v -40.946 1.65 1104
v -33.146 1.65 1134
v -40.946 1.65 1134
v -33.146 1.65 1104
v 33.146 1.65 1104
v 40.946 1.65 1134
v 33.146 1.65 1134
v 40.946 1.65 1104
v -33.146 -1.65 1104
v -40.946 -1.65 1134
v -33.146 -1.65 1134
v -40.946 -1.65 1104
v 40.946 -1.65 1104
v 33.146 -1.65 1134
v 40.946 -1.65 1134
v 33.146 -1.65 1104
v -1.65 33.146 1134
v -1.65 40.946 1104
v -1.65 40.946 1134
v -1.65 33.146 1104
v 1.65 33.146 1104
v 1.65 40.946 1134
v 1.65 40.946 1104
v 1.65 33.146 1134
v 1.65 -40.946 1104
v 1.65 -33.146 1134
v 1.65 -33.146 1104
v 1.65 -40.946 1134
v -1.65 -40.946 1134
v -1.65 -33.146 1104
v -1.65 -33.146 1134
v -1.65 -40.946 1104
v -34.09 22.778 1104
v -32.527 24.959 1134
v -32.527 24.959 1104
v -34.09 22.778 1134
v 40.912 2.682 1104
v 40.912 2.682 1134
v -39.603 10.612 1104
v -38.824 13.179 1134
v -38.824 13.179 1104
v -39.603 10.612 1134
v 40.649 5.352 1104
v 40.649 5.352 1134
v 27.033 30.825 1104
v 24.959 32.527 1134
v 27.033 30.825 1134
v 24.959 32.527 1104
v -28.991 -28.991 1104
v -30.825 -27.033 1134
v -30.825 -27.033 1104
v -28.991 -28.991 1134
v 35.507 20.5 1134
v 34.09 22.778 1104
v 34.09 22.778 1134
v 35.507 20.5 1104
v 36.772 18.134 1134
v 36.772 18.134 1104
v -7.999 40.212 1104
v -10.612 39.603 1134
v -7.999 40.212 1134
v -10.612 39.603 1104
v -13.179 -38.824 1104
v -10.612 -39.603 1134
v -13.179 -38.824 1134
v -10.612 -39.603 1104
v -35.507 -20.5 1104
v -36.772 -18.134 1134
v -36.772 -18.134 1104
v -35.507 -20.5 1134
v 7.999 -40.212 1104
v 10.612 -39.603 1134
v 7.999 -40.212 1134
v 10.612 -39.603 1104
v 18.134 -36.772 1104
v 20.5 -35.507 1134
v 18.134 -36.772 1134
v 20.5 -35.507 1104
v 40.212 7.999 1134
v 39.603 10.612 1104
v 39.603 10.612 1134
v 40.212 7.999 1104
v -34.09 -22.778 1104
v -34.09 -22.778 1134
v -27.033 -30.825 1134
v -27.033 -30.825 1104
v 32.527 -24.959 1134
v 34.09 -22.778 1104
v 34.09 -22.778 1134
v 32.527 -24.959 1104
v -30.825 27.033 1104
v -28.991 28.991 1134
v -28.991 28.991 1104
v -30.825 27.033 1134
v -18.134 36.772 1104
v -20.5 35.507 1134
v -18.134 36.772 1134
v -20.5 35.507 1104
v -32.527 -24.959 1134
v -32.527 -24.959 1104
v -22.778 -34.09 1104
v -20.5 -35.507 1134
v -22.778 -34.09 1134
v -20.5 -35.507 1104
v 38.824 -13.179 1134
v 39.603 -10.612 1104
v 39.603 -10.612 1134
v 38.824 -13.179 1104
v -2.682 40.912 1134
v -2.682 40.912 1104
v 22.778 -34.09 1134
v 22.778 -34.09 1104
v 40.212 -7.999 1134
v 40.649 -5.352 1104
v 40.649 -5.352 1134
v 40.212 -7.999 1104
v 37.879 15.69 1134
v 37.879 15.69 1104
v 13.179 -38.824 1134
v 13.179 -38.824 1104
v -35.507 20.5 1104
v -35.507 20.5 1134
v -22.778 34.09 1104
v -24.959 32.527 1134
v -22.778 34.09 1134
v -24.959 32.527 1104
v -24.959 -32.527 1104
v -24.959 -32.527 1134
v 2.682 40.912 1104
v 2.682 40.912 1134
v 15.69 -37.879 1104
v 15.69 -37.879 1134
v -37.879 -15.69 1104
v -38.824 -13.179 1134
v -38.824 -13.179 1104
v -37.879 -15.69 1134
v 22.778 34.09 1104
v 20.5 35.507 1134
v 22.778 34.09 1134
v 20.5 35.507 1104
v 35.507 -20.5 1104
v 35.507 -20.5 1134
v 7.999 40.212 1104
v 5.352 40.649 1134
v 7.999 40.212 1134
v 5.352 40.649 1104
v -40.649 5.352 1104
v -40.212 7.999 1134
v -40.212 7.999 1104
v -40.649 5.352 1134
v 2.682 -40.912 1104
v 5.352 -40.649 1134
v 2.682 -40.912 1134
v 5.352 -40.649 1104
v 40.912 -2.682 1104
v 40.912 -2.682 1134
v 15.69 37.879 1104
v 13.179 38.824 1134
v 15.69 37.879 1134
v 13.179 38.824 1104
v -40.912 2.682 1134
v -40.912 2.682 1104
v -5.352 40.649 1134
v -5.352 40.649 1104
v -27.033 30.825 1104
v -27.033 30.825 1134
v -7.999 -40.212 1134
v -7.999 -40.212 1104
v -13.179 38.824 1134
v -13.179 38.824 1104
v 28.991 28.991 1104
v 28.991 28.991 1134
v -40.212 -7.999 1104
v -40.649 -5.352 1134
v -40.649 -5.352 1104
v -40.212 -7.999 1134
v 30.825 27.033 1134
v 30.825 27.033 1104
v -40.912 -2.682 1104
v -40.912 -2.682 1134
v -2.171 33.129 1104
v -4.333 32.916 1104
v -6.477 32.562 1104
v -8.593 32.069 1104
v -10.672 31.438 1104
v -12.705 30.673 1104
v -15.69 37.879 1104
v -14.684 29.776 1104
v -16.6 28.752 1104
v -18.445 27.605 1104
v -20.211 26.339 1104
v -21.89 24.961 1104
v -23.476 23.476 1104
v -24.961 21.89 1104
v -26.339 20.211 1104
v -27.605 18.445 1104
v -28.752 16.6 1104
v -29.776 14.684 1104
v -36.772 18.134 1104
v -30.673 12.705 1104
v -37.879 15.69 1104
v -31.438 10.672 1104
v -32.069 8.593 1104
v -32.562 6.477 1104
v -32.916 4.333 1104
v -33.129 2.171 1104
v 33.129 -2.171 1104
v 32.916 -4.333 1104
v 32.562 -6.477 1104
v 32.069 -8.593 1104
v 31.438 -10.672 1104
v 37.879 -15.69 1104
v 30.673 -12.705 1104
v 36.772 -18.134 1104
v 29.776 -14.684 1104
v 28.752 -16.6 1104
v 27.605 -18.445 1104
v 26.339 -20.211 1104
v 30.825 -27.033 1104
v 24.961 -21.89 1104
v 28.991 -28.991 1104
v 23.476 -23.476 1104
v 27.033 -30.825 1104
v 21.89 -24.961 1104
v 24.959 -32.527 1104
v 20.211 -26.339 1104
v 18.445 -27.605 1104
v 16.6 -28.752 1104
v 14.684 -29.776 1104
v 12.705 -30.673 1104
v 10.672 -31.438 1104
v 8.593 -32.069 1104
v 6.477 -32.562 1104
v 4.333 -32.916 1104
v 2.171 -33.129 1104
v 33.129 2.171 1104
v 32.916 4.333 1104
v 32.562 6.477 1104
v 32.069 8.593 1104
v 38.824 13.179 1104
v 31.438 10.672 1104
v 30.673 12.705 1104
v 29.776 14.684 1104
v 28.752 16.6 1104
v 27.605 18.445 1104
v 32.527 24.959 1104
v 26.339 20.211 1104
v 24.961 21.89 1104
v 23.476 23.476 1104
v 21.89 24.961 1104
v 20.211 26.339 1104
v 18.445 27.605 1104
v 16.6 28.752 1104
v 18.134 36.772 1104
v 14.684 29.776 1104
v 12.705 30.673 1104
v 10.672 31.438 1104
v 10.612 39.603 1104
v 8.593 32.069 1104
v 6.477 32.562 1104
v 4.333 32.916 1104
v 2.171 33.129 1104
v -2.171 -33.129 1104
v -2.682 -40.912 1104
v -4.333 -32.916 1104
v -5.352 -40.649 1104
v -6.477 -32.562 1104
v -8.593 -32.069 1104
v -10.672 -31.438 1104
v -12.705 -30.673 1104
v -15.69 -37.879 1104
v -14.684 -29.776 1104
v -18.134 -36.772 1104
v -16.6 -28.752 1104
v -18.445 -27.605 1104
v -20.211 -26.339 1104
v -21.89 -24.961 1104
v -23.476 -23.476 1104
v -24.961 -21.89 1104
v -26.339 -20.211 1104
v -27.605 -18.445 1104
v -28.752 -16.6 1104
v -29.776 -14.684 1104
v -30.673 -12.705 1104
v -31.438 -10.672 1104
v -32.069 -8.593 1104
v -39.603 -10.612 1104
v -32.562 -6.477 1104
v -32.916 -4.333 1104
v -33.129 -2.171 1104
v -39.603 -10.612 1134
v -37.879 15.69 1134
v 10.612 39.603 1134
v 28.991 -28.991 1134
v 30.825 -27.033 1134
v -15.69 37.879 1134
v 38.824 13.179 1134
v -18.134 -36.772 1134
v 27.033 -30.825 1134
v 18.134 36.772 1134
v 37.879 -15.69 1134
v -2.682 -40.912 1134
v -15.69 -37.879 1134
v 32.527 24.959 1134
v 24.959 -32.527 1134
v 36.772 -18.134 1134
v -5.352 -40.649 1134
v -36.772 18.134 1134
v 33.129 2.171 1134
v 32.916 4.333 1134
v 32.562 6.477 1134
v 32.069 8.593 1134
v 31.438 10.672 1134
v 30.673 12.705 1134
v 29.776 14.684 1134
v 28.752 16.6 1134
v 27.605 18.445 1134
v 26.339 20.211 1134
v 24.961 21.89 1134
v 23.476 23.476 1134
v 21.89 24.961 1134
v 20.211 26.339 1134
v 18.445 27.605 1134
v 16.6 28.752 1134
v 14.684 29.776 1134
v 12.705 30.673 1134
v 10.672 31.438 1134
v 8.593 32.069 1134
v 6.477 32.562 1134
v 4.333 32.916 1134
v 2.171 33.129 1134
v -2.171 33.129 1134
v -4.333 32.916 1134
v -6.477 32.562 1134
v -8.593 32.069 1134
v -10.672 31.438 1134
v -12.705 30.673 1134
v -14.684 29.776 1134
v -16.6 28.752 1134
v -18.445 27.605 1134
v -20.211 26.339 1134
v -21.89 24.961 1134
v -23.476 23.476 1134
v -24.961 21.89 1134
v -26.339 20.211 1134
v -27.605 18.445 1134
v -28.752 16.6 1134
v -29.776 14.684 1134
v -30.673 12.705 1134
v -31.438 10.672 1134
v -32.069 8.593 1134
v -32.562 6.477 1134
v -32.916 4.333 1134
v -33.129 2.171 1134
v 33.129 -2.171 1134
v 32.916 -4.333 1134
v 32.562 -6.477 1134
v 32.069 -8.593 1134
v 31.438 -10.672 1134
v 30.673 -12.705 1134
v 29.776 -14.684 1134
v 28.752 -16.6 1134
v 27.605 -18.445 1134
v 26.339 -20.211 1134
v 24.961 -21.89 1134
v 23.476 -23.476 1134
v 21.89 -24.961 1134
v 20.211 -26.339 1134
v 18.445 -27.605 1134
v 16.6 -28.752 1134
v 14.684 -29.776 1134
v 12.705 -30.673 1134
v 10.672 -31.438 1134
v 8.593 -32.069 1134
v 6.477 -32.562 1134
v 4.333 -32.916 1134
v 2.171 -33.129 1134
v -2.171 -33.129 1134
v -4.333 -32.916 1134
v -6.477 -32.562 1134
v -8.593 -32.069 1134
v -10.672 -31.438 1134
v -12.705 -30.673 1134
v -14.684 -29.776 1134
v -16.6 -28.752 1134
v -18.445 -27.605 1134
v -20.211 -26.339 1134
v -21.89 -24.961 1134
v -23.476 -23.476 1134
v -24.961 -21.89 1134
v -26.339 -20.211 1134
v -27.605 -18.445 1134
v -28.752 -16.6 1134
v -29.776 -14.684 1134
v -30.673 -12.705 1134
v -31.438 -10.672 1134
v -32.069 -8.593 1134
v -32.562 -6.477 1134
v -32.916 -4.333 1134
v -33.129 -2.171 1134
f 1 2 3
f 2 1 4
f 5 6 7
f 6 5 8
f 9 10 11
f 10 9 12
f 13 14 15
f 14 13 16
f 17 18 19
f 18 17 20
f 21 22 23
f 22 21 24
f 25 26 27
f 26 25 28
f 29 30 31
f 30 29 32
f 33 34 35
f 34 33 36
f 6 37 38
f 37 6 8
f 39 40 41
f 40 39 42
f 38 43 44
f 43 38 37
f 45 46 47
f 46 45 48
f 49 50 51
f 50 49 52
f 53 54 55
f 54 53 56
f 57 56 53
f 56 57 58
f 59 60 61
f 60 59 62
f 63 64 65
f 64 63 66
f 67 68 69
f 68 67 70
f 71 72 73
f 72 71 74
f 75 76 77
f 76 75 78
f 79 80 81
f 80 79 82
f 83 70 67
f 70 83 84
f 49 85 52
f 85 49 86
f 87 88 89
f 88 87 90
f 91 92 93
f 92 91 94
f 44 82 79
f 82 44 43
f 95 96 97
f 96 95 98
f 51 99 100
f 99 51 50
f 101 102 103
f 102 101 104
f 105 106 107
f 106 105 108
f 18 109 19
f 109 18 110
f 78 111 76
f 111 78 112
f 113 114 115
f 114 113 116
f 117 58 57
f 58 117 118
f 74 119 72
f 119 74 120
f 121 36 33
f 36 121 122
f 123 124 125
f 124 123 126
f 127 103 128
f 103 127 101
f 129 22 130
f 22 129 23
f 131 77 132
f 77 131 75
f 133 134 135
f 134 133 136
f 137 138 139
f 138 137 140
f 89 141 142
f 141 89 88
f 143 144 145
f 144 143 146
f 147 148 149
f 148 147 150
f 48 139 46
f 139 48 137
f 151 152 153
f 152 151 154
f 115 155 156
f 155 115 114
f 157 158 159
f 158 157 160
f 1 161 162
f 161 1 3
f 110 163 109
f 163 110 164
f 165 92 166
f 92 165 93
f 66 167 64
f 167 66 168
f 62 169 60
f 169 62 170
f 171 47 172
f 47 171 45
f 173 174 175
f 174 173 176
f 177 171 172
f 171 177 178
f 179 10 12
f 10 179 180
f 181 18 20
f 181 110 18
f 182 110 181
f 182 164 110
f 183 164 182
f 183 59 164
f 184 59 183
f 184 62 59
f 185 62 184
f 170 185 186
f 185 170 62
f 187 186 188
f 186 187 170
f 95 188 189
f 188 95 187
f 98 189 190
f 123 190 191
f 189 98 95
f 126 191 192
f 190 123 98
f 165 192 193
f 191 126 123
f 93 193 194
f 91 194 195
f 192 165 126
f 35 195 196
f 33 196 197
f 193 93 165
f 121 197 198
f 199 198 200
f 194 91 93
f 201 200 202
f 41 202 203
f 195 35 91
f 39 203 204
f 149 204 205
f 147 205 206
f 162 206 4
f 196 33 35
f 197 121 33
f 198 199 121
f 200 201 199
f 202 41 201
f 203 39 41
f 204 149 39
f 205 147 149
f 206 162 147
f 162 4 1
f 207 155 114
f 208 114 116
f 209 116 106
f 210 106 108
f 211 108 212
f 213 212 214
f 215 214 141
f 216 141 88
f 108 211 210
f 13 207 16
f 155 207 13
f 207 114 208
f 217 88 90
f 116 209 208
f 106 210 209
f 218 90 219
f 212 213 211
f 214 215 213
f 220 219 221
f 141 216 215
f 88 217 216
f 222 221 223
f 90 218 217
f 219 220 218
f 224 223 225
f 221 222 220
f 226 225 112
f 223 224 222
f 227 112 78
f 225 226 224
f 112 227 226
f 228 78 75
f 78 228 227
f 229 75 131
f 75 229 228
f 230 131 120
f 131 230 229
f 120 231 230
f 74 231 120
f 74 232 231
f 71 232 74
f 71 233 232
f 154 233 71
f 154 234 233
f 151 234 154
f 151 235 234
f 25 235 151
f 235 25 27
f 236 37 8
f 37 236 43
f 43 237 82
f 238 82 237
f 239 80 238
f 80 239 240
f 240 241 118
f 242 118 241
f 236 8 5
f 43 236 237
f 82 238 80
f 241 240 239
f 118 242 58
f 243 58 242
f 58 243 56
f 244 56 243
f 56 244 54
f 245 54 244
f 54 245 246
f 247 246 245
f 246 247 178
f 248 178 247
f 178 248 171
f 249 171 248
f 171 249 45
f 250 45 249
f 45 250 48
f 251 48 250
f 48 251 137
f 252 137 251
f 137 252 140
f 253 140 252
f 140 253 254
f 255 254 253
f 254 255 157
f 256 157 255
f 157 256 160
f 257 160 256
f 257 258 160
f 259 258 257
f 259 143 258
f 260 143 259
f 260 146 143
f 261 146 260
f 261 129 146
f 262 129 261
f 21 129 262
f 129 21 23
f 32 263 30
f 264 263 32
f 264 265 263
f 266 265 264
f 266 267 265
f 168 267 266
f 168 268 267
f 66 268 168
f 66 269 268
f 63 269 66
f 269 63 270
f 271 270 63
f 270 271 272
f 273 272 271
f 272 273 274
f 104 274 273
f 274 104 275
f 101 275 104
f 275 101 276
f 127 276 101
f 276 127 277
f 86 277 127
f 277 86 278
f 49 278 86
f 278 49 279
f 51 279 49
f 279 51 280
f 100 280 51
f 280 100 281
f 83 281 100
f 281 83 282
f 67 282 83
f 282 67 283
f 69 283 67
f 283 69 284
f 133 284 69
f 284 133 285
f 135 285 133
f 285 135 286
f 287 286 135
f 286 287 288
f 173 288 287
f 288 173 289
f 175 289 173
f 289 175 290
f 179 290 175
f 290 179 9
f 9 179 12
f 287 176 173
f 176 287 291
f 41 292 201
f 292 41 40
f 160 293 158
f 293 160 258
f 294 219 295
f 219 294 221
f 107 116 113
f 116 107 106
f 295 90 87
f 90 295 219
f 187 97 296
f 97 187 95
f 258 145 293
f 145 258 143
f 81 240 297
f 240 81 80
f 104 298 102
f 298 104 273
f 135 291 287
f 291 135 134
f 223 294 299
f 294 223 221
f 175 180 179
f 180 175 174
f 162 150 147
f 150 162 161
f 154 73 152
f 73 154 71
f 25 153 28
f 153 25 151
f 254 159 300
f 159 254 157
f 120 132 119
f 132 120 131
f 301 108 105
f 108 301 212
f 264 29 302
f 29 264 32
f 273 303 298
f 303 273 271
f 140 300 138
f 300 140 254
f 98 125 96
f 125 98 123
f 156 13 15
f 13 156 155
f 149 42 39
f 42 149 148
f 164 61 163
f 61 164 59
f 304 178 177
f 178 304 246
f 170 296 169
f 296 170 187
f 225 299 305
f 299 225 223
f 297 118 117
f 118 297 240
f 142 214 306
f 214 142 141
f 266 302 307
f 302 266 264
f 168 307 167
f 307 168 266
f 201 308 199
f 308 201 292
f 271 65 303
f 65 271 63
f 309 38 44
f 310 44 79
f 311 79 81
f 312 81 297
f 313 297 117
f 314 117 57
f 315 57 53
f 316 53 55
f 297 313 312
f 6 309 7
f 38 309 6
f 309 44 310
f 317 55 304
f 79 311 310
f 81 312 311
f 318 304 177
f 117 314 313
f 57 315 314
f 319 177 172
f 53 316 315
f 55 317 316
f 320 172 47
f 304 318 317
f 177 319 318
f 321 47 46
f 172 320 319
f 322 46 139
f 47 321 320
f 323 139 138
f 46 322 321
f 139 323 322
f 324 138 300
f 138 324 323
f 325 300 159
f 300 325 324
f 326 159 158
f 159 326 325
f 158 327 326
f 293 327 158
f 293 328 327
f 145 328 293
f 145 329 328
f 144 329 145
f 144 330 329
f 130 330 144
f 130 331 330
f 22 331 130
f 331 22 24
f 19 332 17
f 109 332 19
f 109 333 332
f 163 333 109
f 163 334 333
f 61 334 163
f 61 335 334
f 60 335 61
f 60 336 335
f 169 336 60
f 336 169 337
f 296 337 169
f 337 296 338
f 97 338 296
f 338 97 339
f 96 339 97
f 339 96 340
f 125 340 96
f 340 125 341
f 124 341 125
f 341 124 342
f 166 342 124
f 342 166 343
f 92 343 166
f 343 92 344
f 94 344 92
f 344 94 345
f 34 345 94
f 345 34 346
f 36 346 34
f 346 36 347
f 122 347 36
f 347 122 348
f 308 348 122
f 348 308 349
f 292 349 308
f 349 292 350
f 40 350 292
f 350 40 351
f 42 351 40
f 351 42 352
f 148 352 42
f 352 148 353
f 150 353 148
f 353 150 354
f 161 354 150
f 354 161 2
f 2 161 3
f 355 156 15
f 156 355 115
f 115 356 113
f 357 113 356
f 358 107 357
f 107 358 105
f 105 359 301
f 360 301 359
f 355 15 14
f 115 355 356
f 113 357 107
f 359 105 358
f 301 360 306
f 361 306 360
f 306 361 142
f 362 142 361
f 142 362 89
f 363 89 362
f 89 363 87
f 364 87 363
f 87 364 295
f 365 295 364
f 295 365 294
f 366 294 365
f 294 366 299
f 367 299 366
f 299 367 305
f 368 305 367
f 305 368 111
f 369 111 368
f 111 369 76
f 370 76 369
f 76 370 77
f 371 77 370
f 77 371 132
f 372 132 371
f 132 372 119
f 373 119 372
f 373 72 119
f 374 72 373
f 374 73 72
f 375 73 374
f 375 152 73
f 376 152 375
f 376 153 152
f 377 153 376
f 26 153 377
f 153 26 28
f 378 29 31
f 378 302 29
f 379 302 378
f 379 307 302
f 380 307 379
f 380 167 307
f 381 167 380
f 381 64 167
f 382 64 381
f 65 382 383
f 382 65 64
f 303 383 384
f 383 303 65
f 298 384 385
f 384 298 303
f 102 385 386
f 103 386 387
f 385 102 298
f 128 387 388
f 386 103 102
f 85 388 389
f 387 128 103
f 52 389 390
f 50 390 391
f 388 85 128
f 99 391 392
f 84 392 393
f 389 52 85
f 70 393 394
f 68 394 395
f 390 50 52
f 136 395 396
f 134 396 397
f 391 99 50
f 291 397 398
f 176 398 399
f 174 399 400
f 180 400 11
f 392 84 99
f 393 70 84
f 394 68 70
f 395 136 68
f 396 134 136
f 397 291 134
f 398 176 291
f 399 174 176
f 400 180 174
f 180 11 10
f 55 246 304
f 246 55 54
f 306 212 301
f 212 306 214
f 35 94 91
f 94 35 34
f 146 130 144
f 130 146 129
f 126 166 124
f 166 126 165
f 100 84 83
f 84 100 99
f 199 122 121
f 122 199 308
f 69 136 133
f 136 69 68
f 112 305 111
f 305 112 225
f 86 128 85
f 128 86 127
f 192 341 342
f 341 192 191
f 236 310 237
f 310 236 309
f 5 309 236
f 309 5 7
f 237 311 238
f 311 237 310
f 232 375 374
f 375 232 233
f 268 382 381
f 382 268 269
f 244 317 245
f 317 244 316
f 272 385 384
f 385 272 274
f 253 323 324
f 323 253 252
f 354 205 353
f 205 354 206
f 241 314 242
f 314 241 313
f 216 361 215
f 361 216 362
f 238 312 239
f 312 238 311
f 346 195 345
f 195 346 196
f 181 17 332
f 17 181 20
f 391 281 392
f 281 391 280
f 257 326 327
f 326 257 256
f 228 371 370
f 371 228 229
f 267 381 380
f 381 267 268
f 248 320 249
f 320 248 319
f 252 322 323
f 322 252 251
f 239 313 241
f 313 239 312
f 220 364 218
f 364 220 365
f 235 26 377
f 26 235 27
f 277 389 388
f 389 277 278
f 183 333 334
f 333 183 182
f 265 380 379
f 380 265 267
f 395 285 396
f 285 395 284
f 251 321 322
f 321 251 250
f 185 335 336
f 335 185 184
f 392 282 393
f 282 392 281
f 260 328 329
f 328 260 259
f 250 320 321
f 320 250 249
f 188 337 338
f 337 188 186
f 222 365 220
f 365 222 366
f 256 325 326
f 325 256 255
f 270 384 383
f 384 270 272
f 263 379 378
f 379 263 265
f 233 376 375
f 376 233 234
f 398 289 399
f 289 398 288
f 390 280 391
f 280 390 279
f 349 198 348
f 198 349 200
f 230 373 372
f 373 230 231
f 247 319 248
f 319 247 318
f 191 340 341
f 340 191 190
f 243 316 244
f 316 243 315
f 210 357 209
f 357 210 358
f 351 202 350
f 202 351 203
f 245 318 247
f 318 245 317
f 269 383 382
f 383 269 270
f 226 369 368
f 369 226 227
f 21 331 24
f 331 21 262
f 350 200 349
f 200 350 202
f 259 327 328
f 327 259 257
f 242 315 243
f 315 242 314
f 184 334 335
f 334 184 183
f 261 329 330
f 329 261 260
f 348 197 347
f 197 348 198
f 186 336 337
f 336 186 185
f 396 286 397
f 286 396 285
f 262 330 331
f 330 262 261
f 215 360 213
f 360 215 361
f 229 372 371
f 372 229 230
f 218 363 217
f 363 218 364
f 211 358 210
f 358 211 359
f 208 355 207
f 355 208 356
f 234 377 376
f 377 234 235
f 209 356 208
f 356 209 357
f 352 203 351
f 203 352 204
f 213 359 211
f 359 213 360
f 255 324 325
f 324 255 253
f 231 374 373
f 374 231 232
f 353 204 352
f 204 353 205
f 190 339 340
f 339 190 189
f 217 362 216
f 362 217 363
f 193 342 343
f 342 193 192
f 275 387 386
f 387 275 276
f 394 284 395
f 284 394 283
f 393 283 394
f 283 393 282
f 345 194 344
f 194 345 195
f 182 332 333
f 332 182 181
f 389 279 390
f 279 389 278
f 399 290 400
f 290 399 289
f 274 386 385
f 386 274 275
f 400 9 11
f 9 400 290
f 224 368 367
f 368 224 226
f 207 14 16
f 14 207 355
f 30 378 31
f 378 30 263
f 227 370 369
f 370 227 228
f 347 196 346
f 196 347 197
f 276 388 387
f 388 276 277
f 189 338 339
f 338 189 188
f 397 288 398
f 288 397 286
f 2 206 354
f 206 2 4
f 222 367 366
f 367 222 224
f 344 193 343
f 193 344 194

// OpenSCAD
// file: ../lib/astra66_core.scad
// =============================================================================
// ASTRA-66 CAD rev B -- core library
// Parameters (generated from analysis.py by build.py), derived stations and helpers.
// Every part file includes this; stations mirror analysis.py X[] exactly.
//
// Frame: rocket axis = +Z, STA 0 = nose tip, stations increase aft.
// Angles: measured about +Z from +X toward +Y.  90 deg = switch / hatch side,
// 270 deg = camera side, 45 deg = rail-button line, fins at 0/90/180/270 deg.
// =============================================================================
include <../astra66_params.scad>

$fn = FN;
EPS = 0.01;
CAD_REV = "B";

// ----------------------------------------------------------------- radii
R_OD    = BODY_OD / 2;                 // body tube outer
R_ID    = BODY_ID / 2;                 // body tube inner
R_SH    = (BODY_ID - FIT_SH) / 2;      // printed shoulder / ring OD radius
R_SI    = R_SH - NC_SH_WALL;           // nose shoulder inner radius
R_CO    = CPL_OD / 2;                  // coupler outer
R_CI    = CPL_ID / 2;                  // coupler inner
R_BH_IN = (CPL_ID - 0.2) / 2;          // inner bulkhead disc (fits in coupler)
R_MO    = MMT_OD / 2;
R_MI    = MMT_ID / 2;
R_RING_BORE = (MMT_OD + FIT_SH) / 2;   // centering-ring / core bore
R_TAB_FLOOR = max(R_MO, RET_CLEAR_D / 2);          // rev B: tab clears the COTS retainer
FIN_TAB_H   = R_OD - R_TAB_FLOOR - FIN_TAB_CLR;

// ----------------------------------------------------------------- stations
X_NC_BASE     = NC_L;
X_SH_END      = NC_L + NC_SH_L;
X_PL_END      = NC_L + PL_L;
X_BAND_END    = X_PL_END + AV_BAND_L;
X_END         = X_BAND_END + BO_L;
L_OVERALL     = X_END;                              // airframe length (excl. COTS retainer)
X_CPL_FWD     = X_PL_END - AV_INS;
X_CPL_AFT     = X_BAND_END + AV_INS;
X_AVB_FWD_OUT = X_CPL_FWD - AV_BH_T;                // AV-303 forward face
X_AVB_AFT_OUT = X_CPL_AFT + GASKET_T;               // AV-304 outer-disc forward face
X_AVB_AFT_END = X_AVB_AFT_OUT + AV_BH_T;            // AV-304 aft face (recovery bay starts)
X_SLED_FWD    = X_CPL_FWD + AV_BH_T + SLED_FWD_GAP;
X_SLED_AFT    = X_SLED_FWD + SLED_L;
X_MMT_AFT     = X_END + MMT_AFT_EXT;
X_MMT_FWD     = X_MMT_AFT - MMT_L;
X_FIN_LE      = X_END - FIN_CR;
X_TAB_FWD     = X_FIN_LE + FIN_TAB_FWD;
X_TAB_AFT     = X_END - LOCK_T;
X_CORE_FWD    = X_TAB_FWD - CORE_RING_T;
X_CORE_AFT    = X_END - LOCK_T;
X_NC_SCREW    = NC_L + NC_SH_L / 2;
X_CAM         = X_SH_END + CAM_OFF;
X_HATCH       = X_SH_END + HATCH_OFF;
X_RB_FWD      = X_MMT_FWD - RB_FWD_OFF;
X_RB_AFT      = X_END - RB_AFT_OFF;
X_TRAY_FWD    = X_AVB_FWD_OUT - TRAY_L;
X_SW          = X_PL_END + AV_BAND_L / 2;
X_MOTOR_FWD   = X_MMT_AFT - MOTOR_L;
X_BAT0        = X_SLED_FWD + 2;
BAT_CAGE_L    = 12 + BAT_L + 0.6;
PAYLOAD_BAY_L  = X_AVB_FWD_OUT - X_SH_END;
RECOVERY_BAY_L = X_MMT_FWD - X_AVB_AFT_END;

FIN_ANGLES      = [for (i = [0 : FIN_N - 1]) i * 360 / FIN_N];
LOCK_SCREW_ANG  = [45, 135, 225, 315];
STATIC_PORT_ANG = [45, 135, 225, 315];

// ----------------------------------------------------------------- geometry helpers
function ogive_rho()  = (R_OD * R_OD + NC_L * NC_L) / (2 * R_OD);
function ogive_r(x)   = sqrt(max(pow(ogive_rho(), 2) - pow(NC_L - x, 2), 0)) + R_OD - ogive_rho();

// Solid of revolution of the tangent ogive between stations x0..x1, radially offset inward by off.
module ogive_solid(x0, x1, off = 0, n = 72) {
    s = (x0 == 0) ? 1 : 0;
    rotate_extrude()
        polygon(concat([[0, x0]],
                       [for (i = [s : n]) let(x = x0 + (x1 - x0) * i / n) [max(ogive_r(x) - off, 0.01), x]],
                       [[0, x1]]));
}

module tube_r(ro, ri, z0, z1) {
    translate([0, 0, z0]) difference() {
        cylinder(r = ro, h = z1 - z0);
        translate([0, 0, -1]) cylinder(r = ri, h = z1 - z0 + 2);
    }
}

module at_angle(a) { rotate([0, 0, a]) children(); }

// Cylinder of diameter d along the radial direction at angle a, from radius r0 to r1, at station z.
module radial_cyl(d, z, a, r0, r1) {
    at_angle(a) translate([r0, 0, z]) rotate([0, 90, 0]) cylinder(d = d, h = r1 - r0);
}

module rounded_rect(l, w, r) { offset(r = r) square([l - 2 * r, w - 2 * r], center = true); }

// Radial prism with a rounded-rectangle footprint (l axial x w tangential) centred at station z.
module radial_prism(a, z, l, w, rr, r0, r1) {
    at_angle(a) translate([r0, 0, z]) rotate([0, 90, 0]) linear_extrude(r1 - r0) rounded_rect(l, w, rr);
}

// Block in the radial frame at angle a: radial r0..r1, tangential +/-hw, stations z0..z1, clipped to radius rc.
module radial_block(a, r0, r1, hw, z0, z1, rc) {
    intersection() {
        at_angle(a) translate([r0, -hw, z0]) cube([r1 - r0, 2 * hw, z1 - z0]);
        translate([0, 0, z0 - 1]) cylinder(r = rc, h = z1 - z0 + 2);
    }
}

// Camera frame: child +Z = lens axis (outward, tilted CAM_TILT aft), origin at the lens face centre.
// Lens-face radius CAM_R0 is the smaller of (a) the tilted barrel rim 0.5 mm inside the bore and
// (b) the tilted camera-body corners 0.5 mm inside the bore -- so any CAM_W/CAM_LEN entered fits.
CAM_SETBACK = CAM_LENS_L * cos(CAM_TILT) + (CAM_LENS_HOLE - 1) / 2 * sin(CAM_TILT) + 0.5;
CAM_R0 = min(R_ID - CAM_SETBACK, sqrt(pow(R_ID - 0.5, 2) - pow(CAM_W / 2, 2)) - CAM_LEN / 2 * sin(CAM_TILT));
module cam_frame() {
    at_angle(CAM_ANG) translate([CAM_R0, 0, X_CAM]) rotate([0, 90 - CAM_TILT, 0]) children();
}

echo(str("ASTRA-66 CAD rev ", CAD_REV, ": L_OVERALL=", L_OVERALL, " payload bay=", PAYLOAD_BAY_L,
         " recovery bay=", RECOVERY_BAY_L, " fin tab depth=", FIN_TAB_H));
// main file
// ASTRA-66 CAD rev B -- GS-701 Fin alignment jig (ground support; not flight hardware)
// Collar over the tail with FIN_N slots (FIN_T + 0.3) at the fin angles: holds 90 deg spacing and zero
// cant while BO-403 cures. PETG, FDM.
include <../lib/astra66_core.scad>

module GS_701_fin_jig() {
    translate([0, 0, X_END - 40]) difference() {
        cylinder(d = BODY_OD + 16, h = 30);
        translate([0, 0, -1]) cylinder(d = BODY_OD + 0.4, h = 32);
        for (a = FIN_ANGLES) at_angle(a) translate([0, -(FIN_T + 0.3) / 2, -1]) cube([60, FIN_T + 0.3, 32]);
    }
}

GS_701_fin_jig();
